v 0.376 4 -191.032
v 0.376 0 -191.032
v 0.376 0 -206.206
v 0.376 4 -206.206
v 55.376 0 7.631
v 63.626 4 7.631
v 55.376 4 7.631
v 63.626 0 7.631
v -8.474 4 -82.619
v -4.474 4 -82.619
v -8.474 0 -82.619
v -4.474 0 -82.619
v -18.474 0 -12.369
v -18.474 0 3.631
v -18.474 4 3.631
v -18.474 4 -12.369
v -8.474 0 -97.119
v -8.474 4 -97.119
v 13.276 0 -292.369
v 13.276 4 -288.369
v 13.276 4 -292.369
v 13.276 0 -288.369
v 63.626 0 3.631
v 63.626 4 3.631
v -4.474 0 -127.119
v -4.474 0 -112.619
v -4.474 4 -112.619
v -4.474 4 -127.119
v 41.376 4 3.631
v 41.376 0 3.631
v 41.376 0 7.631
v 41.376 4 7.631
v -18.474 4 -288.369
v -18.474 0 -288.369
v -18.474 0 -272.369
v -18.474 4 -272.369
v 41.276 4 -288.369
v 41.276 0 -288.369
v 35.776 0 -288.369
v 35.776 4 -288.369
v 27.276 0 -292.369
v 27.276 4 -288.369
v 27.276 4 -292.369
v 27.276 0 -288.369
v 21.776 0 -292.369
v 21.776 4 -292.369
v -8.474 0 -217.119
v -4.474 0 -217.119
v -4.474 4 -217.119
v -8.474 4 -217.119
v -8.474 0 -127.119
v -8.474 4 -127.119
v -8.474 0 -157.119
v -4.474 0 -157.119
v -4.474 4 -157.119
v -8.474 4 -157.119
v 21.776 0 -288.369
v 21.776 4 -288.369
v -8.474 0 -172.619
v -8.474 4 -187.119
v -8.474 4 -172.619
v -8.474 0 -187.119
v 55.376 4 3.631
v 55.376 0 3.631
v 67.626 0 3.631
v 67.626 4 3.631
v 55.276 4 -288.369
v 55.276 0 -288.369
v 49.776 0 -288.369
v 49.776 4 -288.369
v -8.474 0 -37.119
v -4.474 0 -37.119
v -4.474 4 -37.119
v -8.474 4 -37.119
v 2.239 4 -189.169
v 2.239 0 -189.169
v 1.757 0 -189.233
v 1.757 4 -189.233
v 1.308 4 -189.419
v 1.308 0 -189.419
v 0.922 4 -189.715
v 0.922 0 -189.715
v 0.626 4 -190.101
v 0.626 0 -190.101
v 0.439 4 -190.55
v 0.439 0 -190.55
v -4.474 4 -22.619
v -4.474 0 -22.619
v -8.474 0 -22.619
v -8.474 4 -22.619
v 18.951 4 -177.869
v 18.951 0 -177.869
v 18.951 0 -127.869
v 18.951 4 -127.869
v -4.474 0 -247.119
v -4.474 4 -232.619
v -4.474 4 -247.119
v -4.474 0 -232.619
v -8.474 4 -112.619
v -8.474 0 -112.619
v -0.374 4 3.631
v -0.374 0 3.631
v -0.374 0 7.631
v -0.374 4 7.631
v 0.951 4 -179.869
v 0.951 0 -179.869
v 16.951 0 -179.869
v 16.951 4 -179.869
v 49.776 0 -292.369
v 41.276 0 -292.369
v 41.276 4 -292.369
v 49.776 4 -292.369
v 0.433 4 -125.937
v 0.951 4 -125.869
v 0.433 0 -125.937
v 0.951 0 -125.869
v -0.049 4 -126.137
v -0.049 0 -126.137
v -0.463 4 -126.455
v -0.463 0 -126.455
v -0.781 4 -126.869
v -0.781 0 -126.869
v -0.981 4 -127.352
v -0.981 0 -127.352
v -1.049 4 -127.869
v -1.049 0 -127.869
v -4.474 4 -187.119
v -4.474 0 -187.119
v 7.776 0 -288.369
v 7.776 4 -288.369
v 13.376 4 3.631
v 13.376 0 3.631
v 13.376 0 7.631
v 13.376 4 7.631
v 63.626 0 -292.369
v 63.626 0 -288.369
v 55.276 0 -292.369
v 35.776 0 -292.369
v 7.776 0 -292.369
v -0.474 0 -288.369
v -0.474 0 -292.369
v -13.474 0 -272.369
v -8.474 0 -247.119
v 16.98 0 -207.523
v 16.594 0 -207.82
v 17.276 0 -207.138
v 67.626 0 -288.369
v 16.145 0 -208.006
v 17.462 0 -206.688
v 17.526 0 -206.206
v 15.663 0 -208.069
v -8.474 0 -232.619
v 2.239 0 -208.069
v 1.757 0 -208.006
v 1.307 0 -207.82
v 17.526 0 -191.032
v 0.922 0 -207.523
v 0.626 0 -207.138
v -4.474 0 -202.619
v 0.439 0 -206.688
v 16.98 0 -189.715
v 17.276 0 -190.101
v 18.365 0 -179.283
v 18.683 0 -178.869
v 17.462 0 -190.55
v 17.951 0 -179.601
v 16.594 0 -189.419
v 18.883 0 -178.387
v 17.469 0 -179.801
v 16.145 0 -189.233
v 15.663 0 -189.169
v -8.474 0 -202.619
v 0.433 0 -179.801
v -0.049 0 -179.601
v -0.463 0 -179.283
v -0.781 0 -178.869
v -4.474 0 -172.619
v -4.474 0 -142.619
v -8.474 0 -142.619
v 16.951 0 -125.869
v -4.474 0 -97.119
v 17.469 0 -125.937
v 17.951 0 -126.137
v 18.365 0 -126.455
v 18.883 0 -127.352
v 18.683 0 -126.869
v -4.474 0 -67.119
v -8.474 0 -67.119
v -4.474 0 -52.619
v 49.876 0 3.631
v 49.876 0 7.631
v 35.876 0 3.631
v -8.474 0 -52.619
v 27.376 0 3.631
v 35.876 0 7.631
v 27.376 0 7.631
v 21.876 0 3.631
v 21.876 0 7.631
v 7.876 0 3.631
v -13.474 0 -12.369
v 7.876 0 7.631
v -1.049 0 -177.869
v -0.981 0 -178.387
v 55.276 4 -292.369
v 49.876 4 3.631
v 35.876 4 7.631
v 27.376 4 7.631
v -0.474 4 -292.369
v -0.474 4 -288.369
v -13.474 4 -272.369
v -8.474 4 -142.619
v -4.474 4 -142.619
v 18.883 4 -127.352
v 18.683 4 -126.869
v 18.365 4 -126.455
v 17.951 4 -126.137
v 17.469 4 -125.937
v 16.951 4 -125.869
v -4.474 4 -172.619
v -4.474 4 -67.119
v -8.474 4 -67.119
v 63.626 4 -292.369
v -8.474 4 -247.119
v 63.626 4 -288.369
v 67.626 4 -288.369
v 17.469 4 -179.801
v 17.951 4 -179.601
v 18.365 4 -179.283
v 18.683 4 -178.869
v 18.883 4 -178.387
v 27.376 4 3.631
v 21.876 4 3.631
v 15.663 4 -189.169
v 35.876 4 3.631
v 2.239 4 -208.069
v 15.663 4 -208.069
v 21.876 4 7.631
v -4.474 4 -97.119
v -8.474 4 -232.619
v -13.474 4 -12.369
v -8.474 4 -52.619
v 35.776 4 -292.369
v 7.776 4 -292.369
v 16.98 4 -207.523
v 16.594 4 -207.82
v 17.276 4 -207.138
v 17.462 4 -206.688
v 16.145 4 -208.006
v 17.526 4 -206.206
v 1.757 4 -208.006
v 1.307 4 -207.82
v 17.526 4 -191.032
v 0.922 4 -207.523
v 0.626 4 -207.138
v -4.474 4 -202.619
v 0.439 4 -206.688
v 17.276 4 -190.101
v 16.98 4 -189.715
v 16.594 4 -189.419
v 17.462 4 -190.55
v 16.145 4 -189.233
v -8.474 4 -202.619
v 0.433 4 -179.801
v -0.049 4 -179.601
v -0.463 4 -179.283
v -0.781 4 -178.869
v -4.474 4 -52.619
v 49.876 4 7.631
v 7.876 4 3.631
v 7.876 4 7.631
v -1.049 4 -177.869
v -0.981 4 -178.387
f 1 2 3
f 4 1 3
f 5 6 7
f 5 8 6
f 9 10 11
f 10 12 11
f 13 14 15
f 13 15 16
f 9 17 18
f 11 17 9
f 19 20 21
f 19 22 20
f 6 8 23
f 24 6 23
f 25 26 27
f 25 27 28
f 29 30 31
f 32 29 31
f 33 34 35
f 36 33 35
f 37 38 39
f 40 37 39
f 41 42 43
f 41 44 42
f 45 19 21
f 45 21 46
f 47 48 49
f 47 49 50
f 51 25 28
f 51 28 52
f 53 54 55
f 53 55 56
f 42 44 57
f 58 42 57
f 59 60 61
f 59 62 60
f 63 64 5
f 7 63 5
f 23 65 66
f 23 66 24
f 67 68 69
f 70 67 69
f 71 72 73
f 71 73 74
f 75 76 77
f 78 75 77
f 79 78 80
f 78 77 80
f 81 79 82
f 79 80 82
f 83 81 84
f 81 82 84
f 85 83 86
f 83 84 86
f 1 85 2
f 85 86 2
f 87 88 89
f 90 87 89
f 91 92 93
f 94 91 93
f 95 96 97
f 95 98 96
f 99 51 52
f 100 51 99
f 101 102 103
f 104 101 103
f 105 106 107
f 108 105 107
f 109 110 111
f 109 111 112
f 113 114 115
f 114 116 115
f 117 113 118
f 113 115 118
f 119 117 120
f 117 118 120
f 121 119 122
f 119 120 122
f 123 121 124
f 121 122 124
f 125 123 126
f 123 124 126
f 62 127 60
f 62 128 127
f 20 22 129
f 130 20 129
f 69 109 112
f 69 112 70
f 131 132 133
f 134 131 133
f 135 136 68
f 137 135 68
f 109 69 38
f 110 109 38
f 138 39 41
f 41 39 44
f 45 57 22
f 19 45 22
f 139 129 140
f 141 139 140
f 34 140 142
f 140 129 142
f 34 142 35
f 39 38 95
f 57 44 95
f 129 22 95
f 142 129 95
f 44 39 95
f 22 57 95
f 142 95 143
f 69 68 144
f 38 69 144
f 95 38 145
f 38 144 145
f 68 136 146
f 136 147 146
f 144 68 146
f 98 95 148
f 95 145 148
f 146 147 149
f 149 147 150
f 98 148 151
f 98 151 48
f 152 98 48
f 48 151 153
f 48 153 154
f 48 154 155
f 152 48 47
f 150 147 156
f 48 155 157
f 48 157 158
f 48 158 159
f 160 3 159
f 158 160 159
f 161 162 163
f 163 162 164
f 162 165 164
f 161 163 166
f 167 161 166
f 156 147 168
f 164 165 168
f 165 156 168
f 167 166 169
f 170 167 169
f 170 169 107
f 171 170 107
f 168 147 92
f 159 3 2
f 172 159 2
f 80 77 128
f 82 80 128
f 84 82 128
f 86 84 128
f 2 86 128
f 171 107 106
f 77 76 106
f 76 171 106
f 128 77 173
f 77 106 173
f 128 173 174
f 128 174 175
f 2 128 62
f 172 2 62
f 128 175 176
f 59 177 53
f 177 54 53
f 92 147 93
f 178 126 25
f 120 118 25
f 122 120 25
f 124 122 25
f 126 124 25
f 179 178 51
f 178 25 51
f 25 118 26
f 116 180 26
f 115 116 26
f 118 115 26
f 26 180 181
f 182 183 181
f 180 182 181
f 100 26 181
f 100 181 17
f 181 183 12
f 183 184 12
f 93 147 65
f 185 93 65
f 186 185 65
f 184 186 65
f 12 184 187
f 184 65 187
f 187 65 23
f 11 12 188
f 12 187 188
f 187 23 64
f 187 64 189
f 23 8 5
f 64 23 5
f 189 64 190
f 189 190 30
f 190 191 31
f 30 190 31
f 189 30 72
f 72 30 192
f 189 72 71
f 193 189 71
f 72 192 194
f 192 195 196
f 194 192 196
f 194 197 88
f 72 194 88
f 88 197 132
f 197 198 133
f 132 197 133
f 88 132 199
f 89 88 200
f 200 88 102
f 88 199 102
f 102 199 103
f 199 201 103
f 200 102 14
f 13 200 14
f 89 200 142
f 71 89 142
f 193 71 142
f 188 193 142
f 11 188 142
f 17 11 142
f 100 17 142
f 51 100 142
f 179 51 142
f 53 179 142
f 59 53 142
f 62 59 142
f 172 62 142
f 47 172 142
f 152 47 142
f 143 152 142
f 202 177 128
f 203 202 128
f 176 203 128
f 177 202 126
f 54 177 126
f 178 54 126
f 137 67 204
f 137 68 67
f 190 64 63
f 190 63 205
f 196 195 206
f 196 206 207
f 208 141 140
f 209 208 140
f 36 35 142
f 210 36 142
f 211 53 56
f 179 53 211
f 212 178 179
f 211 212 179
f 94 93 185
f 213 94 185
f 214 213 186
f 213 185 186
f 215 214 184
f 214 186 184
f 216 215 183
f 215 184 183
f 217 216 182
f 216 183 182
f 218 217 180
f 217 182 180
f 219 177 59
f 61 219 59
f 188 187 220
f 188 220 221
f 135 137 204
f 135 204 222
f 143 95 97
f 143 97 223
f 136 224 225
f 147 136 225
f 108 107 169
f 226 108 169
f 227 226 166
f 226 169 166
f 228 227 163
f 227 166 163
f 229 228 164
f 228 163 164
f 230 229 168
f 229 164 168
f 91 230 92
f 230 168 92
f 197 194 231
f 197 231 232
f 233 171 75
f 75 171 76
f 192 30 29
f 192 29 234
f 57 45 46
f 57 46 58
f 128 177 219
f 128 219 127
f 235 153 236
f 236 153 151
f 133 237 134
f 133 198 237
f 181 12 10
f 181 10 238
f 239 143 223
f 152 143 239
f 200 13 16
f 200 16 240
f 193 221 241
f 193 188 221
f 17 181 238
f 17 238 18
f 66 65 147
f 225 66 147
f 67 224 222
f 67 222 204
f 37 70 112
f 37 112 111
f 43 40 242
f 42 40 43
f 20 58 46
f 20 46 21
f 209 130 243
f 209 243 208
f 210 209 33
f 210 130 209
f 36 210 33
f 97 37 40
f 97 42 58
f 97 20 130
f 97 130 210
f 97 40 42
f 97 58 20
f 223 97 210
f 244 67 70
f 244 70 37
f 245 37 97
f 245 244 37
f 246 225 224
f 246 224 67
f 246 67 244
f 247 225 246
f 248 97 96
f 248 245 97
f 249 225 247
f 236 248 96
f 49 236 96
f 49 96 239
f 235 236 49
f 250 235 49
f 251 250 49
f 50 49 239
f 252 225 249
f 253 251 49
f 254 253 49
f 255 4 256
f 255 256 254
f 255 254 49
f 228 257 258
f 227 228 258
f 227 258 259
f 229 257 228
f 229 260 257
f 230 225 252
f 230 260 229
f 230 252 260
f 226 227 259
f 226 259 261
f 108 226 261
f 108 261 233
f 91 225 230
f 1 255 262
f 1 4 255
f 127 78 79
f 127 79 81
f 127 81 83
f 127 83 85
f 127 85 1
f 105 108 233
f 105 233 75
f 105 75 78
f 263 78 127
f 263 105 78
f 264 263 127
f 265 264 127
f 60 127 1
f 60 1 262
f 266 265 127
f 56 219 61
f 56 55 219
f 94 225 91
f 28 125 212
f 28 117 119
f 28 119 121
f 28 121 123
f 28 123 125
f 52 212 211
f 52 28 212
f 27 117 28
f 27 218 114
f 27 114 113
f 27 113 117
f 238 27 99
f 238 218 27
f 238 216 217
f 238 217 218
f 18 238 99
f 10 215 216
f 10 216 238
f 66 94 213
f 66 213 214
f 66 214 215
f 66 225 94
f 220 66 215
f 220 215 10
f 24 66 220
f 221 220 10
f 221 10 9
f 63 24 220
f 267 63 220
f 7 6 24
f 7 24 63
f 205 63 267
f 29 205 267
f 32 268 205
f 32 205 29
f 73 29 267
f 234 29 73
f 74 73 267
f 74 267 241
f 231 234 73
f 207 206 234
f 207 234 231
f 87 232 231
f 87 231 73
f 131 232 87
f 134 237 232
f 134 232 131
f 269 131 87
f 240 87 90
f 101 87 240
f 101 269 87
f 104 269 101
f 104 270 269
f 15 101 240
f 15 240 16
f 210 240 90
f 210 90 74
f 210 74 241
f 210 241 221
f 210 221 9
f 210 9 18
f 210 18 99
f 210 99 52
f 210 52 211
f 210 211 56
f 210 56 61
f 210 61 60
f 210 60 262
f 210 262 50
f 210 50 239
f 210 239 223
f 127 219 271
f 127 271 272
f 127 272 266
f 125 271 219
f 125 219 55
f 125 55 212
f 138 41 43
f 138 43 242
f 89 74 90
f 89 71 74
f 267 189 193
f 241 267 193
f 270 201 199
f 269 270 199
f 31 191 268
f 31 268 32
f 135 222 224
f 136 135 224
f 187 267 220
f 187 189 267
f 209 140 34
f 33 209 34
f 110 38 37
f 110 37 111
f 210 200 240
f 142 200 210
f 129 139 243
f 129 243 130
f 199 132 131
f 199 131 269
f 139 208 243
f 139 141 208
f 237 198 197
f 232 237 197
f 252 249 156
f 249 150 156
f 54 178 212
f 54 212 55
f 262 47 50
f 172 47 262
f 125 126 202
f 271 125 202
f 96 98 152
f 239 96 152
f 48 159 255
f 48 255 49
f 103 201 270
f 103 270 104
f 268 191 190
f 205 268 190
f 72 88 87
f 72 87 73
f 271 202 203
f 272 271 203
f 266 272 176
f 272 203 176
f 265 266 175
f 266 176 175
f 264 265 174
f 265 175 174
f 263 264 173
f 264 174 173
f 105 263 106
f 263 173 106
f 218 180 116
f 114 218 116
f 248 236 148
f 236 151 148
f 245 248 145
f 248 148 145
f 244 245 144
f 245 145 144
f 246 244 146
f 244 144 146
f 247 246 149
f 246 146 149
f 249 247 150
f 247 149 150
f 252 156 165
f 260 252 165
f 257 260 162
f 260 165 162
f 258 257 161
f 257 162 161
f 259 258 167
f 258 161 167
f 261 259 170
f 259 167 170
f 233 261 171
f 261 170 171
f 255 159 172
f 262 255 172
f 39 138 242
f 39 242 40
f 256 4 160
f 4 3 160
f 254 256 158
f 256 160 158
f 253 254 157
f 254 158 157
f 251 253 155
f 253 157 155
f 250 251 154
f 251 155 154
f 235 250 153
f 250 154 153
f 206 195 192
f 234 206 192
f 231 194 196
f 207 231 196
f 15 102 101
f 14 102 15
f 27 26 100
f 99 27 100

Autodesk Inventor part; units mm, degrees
ref_plane "YZ Plane" through (0, 0, 0) normal (1, 0, 0) x (0, 1, 0)
ref_plane "XZ Plane" through (0, 0, 0) normal (0, 1, 0) x (-1, 0, 0)
ref_plane "XY Plane" through (0, 0, 0) normal (0, 0, 1) x (1, 0, 0)
sketch "Sketch1" plane through (0, 0, 0) normal (0, 1, 0) x (-1, 0, 0)
  line L0 (-71.6259, 7.6308) -> (8.4741, 7.6308)
  line L1 (8.4741, 7.6308) -> (8.4741, -292.3692)
  line L2 (8.4741, -292.3692) -> (-71.6259, -292.3692)
  line L3 (-71.6259, -292.3692) -> (-71.6259, 7.6308)
  point P0 (0, 0)
extrude "Extrusion1" add sketch "Sketch1" along normal blind 4
sketch "Sketch2" plane through (0, 0, 0) normal (0, -1, 0) x (1, 0, 0)
  line L0 (-0.3741, 7.6308) -> (-18.4741, 7.6308) construction
  line L1 (-0.3741, 3.6308) -> (-0.3741, 7.6308) construction
  line L2 (7.6259, 7.6308) -> (7.6259, 3.6308) construction
  line L3 (13.6259, 3.6308) -> (7.6259, 3.6308) construction
  line L4 (13.6259, 3.6308) -> (13.6259, 7.6308) construction
  line L5 (21.6259, 7.6308) -> (21.6259, 3.6308) construction
  line L6 (27.6259, 3.6308) -> (21.6259, 3.6308) construction
  line L7 (27.6259, 3.6308) -> (27.6259, 7.6308) construction
  line L8 (35.6259, 7.6308) -> (35.6259, 3.6308) construction
  line L9 (41.6259, 3.6308) -> (35.6259, 3.6308) construction
  line L10 (41.6259, 3.6308) -> (41.6259, 7.6308) construction
  line L11 (49.6259, 7.6308) -> (49.6259, 3.6308) construction
  line L12 (55.6259, 3.6308) -> (49.6259, 3.6308) construction
  line L13 (55.6259, 3.6308) -> (55.6259, 7.6308) construction
  line L14 (63.6259, 7.6308) -> (63.6259, 3.6308) construction
  line L15 (67.6259, 3.6308) -> (63.6259, 3.6308) construction
  line L16 (67.6259, 7.6308) -> (67.6259, -292.3692) projected
  line L17 (71.6259, 7.6308) -> (71.6259, -292.3692) projected
  line L18 (67.6259, 7.6308) -> (67.6259, -292.3692) projected
  line L19 (71.6259, 7.6308) -> (71.6259, -292.3692) projected
  line L20 (67.6259, 7.6308) -> (67.6259, -292.3692) projected
  line L21 (71.6259, 7.6308) -> (71.6259, -292.3692) projected
  line L22 (67.6259, 7.6308) -> (67.6259, -292.3692) projected
  line L23 (71.6259, 7.6308) -> (71.6259, -292.3692) projected
  line L24 (67.6259, 7.6308) -> (67.6259, -292.3692) projected
  line L25 (71.6259, 7.6308) -> (71.6259, -292.3692) projected
  line L26 (67.6259, 7.6308) -> (67.6259, -292.3692) projected
  line L27 (71.6259, 7.6308) -> (71.6259, -292.3692) projected
  line L28 (67.6259, 7.6308) -> (67.6259, -292.3692) projected
  line L29 (71.6259, 7.6308) -> (71.6259, -292.3692) projected
  line L30 (67.6259, 7.6308) -> (67.6259, -292.3692) projected
  line L31 (71.6259, 7.6308) -> (71.6259, -292.3692) projected
  line L32 (67.6259, 7.6308) -> (67.6259, -292.3692) projected
  line L33 (71.6259, 7.6308) -> (71.6259, -292.3692) projected
  line L34 (67.6259, 7.6308) -> (67.6259, -292.3692) projected
  line L35 (71.6259, 7.6308) -> (71.6259, -292.3692) projected
  line L36 (13.5259, -288.3692) -> (7.5259, -288.3692) projected
  line L37 (55.5259, -292.3692) -> (55.5259, -288.3692) projected
  line L38 (55.5259, -288.3692) -> (49.5259, -288.3692) projected
  line L39 (49.5259, -288.3692) -> (49.5259, -292.3692) projected
  line L40 (41.5259, -288.3692) -> (35.5259, -288.3692) projected
  line L41 (41.5259, -292.3692) -> (41.5259, -288.3692) projected
  line L42 (35.5259, -288.3692) -> (35.5259, -292.3692) projected
  line L43 (27.5259, -288.3692) -> (21.5259, -288.3692) projected
  line L44 (27.5259, -292.3692) -> (27.5259, -288.3692) projected
  line L45 (21.5259, -288.3692) -> (21.5259, -292.3692) projected
  line L46 (13.5259, -288.3692) -> (7.5259, -288.3692) projected
  line L47 (13.5259, -292.3692) -> (13.5259, -288.3692) projected
  line L48 (7.5259, -288.3692) -> (7.5259, -292.3692) projected
  line L49 (-8.4741, -292.3692) -> (-8.4741, 7.6308) projected
  line L50 (-8.4741, -22.3692) -> (-8.4741, -37.3692) projected
  line L51 (-8.4741, -37.3692) -> (-4.4741, -37.3692) projected
  line L52 (-4.4741, -22.3692) -> (-4.4741, -37.3692) projected
  line L53 (-8.4741, -22.3692) -> (-4.4741, -22.3692) projected
  line L54 (-8.4741, -52.3692) -> (-8.4741, -67.3692) projected
  line L55 (-8.4741, -67.3692) -> (-4.4741, -67.3692) projected
  line L56 (-4.4741, -52.3692) -> (-4.4741, -67.3692) projected
  line L57 (-8.4741, -52.3692) -> (-4.4741, -52.3692) projected
  line L58 (-8.4741, -82.3692) -> (-8.4741, -97.3692) projected
  line L59 (-8.4741, -97.3692) -> (-4.4741, -97.3692) projected
  line L60 (-4.4741, -82.3692) -> (-4.4741, -97.3692) projected
  line L61 (-8.4741, -82.3692) -> (-4.4741, -82.3692) projected
  line L62 (-8.4741, -112.3692) -> (-8.4741, -127.3692) projected
  line L63 (-8.4741, -127.3692) -> (-4.4741, -127.3692) projected
  line L64 (-4.4741, -112.3692) -> (-4.4741, -127.3692) projected
  line L65 (-8.4741, -112.3692) -> (-4.4741, -112.3692) projected
  line L66 (-8.4741, -142.3692) -> (-8.4741, -157.3692) projected
  line L67 (-8.4741, -157.3692) -> (-4.4741, -157.3692) projected
  line L68 (-4.4741, -142.3692) -> (-4.4741, -157.3692) projected
  line L69 (-8.4741, -142.3692) -> (-4.4741, -142.3692) projected
  line L70 (-8.4741, -172.3692) -> (-8.4741, -187.3692) projected
  line L71 (-8.4741, -187.3692) -> (-4.4741, -187.3692) projected
  line L72 (-4.4741, -172.3692) -> (-4.4741, -187.3692) projected
  line L73 (-8.4741, -172.3692) -> (-4.4741, -172.3692) projected
  line L74 (-8.4741, -202.3692) -> (-8.4741, -217.3692) projected
  line L75 (-8.4741, -217.3692) -> (-4.4741, -217.3692) projected
  line L76 (-4.4741, -202.3692) -> (-4.4741, -217.3692) projected
  line L77 (-8.4741, -202.3692) -> (-4.4741, -202.3692) projected
  line L78 (-8.4741, -232.3692) -> (-8.4741, -247.3692) projected
  line L79 (-8.4741, -247.3692) -> (-4.4741, -247.3692) projected
  line L80 (-4.4741, -232.3692) -> (-4.4741, -247.3692) projected
  line L81 (-8.4741, -232.3692) -> (-4.4741, -232.3692) projected
  line L82 (71.6259, -37.1192) -> (67.6259, -37.1192)
  line L83 (67.6259, -22.6192) -> (71.6259, -22.6192)
  line L84 (67.6259, -52.6192) -> (71.6259, -52.6192)
  line L85 (71.6259, -67.1192) -> (67.6259, -67.1192)
  line L86 (67.6259, -82.6192) -> (71.6259, -82.6192)
  line L87 (71.6259, -97.1192) -> (67.6259, -97.1192)
  line L88 (67.6259, -112.6192) -> (71.6259, -112.6192)
  line L89 (71.6259, -127.1192) -> (67.6259, -127.1192)
  line L90 (67.6259, -142.6192) -> (71.6259, -142.6192)
  line L91 (71.6259, -157.1192) -> (67.6259, -157.1192)
  line L92 (67.6259, -172.6192) -> (71.6259, -172.6192)
  line L93 (71.6259, -187.1192) -> (67.6259, -187.1192)
  line L94 (67.6259, -202.6192) -> (71.6259, -202.6192)
  line L95 (71.6259, -217.1192) -> (67.6259, -217.1192)
  line L96 (67.6259, -232.6192) -> (71.6259, -232.6192)
  line L97 (71.6259, -247.1192) -> (67.6259, -247.1192)
  line L98 (67.6259, -262.6192) -> (71.6259, -262.6192)
  line L99 (71.6259, -277.1192) -> (67.6259, -277.1192)
  line L100 (-4.4741, -22.6192) -> (-8.4741, -22.6192)
  line L101 (-4.4741, -37.1192) -> (-8.4741, -37.1192)
  line L102 (-4.4741, -52.6192) -> (-8.4741, -52.6192)
  line L103 (-4.4741, -67.1192) -> (-8.4741, -67.1192)
  line L104 (-4.4741, -82.6192) -> (-8.4741, -82.6192)
  line L105 (-4.4741, -97.1192) -> (-8.4741, -97.1192)
  line L106 (-4.4741, -112.6192) -> (-8.4741, -112.6192)
  line L107 (-4.4741, -127.1192) -> (-8.4741, -127.1192)
  line L108 (-4.4741, -142.6192) -> (-8.4741, -142.6192)
  line L109 (-4.4741, -157.1192) -> (-8.4741, -157.1192)
  line L110 (-4.4741, -172.6192) -> (-8.4741, -172.6192)
  line L111 (-4.4741, -187.1192) -> (-8.4741, -187.1192)
  line L112 (-4.4741, -202.6192) -> (-8.4741, -202.6192)
  line L113 (-4.4741, -217.1192) -> (-8.4741, -217.1192)
  line L114 (-4.4741, -232.6192) -> (-8.4741, -232.6192)
  line L115 (-4.4741, -247.1192) -> (-8.4741, -247.1192)
  line L116 (7.8759, 7.6308) -> (7.8759, 3.6308)
  line L117 (13.3759, 3.6308) -> (13.3759, 7.6308)
  line L118 (21.8759, 7.6308) -> (21.8759, 3.6308)
  line L119 (27.3759, 3.6308) -> (27.3759, 7.6308)
  line L120 (35.8759, 7.6308) -> (35.8759, 3.6308)
  line L121 (41.3759, 3.6308) -> (41.3759, 7.6308)
  line L122 (49.8759, 7.6308) -> (49.8759, 3.6308)
  line L123 (55.3759, 3.6308) -> (55.3759, 7.6308)
  line L124 (7.7759, -292.3692) -> (7.7759, -288.3692)
  line L125 (13.2759, -288.3692) -> (13.2759, -292.3692)
  line L126 (21.7759, -292.3692) -> (21.7759, -288.3692)
  line L127 (27.2759, -288.3692) -> (27.2759, -292.3692)
  line L128 (35.7759, -292.3692) -> (35.7759, -288.3692)
  line L129 (41.2759, -288.3692) -> (41.2759, -292.3692)
  line L130 (49.7759, -292.3692) -> (49.7759, -288.3692)
  line L131 (55.2759, -288.3692) -> (55.2759, -292.3692)
  line L132 (13.6259, 3.6308) -> (7.6259, 3.6308) projected
  line L133 (27.6259, 3.6308) -> (21.6259, 3.6308) projected
  line L134 (41.6259, 3.6308) -> (35.6259, 3.6308) projected
  line L135 (55.6259, 3.6308) -> (49.6259, 3.6308) projected
  line L136 (71.6259, -292.3692) -> (-8.4741, -292.3692) projected
  line L137 (-0.3741, 3.6308) -> (-0.3741, 7.6308) projected
  line L138 (-8.4741, 7.6308) -> (71.6259, 7.6308) projected
  line L139 (71.6259, 7.6308) -> (71.6259, -292.3692) projected
  line L140 (63.6259, 7.6308) -> (63.6259, 3.6308) projected
  line L141 (67.6259, 3.6308) -> (63.6259, 3.6308) projected
  line L142 (-0.3741, 3.6308) -> (-18.4741, 3.6308) projected
  line L143 (-18.4741, 7.6308) -> (-18.4741, 3.6308) projected
  line L144 (-0.3741, 7.6308) -> (-18.4741, 7.6308) projected
  line L145 (-0.3741, 3.6308) -> (-0.3741, 7.6308) projected
  line L146 (-0.3741, 7.6308) -> (-18.4741, 7.6308) projected
  line L147 (-18.4741, 7.6308) -> (-18.4741, 3.6308) projected
  line L148 (-0.3741, 3.6308) -> (-18.4741, 3.6308) projected
  line L149 (-0.4741, -292.3692) -> (-0.4741, -288.3692) projected
  line L150 (-0.4741, -288.3692) -> (-18.4741, -288.3692) projected
  line L151 (-18.4741, -292.3692) -> (-18.4741, -288.3692) projected
  line L152 (-0.4741, -292.3692) -> (-18.4741, -292.3692) projected
  line L153 (15.6627, -189.1692) -> (2.2391, -189.1692)
  line L154 (0.3759, -191.0324) -> (0.3759, -206.206)
  line L155 (2.2391, -208.0692) -> (15.6627, -208.0692)
  line L156 (17.5259, -206.206) -> (17.5259, -191.0324)
  arc A0 (17.5259, -191.0324) -> (15.6627, -189.1692) centre (15.6627, -191.0324) ccw
  arc A1 (2.2391, -189.1692) -> (0.3759, -191.0324) centre (2.2391, -191.0324) ccw
  arc A2 (15.6627, -208.0692) -> (17.5259, -206.206) centre (15.6627, -206.206) ccw
  arc A3 (0.3759, -206.206) -> (2.2391, -208.0692) centre (2.2391, -206.206) ccw
  line L157 (16.9509, -125.8692) -> (0.9509, -125.8692)
  line L158 (-1.0491, -127.8692) -> (-1.0491, -177.8692)
  line L159 (0.9509, -179.8692) -> (16.9509, -179.8692)
  line L160 (18.9509, -177.8692) -> (18.9509, -127.8692)
  arc A4 (18.9509, -127.8692) -> (16.9509, -125.8692) centre (16.9509, -127.8692) ccw
  arc A5 (0.9509, -125.8692) -> (-1.0491, -127.8692) centre (0.9509, -127.8692) ccw
  arc A6 (16.9509, -179.8692) -> (18.9509, -177.8692) centre (16.9509, -177.8692) ccw
  arc A7 (-1.0491, -177.8692) -> (0.9509, -179.8692) centre (0.9509, -177.8692) ccw
  line L161 (67.6259, -292.3692) -> (71.6259, -292.3692) projected
  line L162 (67.6259, 7.6308) -> (71.6259, 7.6308) projected
  line L163 (67.6259, -292.3692) -> (71.6259, -292.3692) projected
  line L164 (67.6259, 7.6308) -> (71.6259, 7.6308) projected
  line L165 (67.6259, -292.3692) -> (71.6259, -292.3692) projected
  line L166 (67.6259, 7.6308) -> (71.6259, 7.6308) projected
  line L167 (67.6259, -292.3692) -> (71.6259, -292.3692) projected
  line L168 (67.6259, 7.6308) -> (71.6259, 7.6308) projected
  line L169 (67.6259, -292.3692) -> (71.6259, -292.3692) projected
  line L170 (67.6259, 7.6308) -> (71.6259, 7.6308) projected
  line L171 (67.6259, -292.3692) -> (71.6259, -292.3692) projected
  line L172 (67.6259, 7.6308) -> (71.6259, 7.6308) projected
  line L173 (67.6259, -292.3692) -> (71.6259, -292.3692) projected
  line L174 (67.6259, 7.6308) -> (71.6259, 7.6308) projected
  line L175 (67.6259, -292.3692) -> (71.6259, -292.3692) projected
  line L176 (67.6259, 7.6308) -> (71.6259, 7.6308) projected
  line L177 (67.6259, -292.3692) -> (71.6259, -292.3692) projected
  line L178 (67.6259, 7.6308) -> (71.6259, 7.6308) projected
  line L179 (67.6259, -292.3692) -> (71.6259, -292.3692) projected
  line L180 (67.6259, 7.6308) -> (71.6259, 7.6308) projected
  point P0 (0, 0)
  point P1 (71.6259, -7.3692)
  point P2 (71.6259, -37.3692)
  point P3 (71.6259, -22.3692)
  point P4 (71.6259, -67.3692)
  point P5 (71.6259, -52.3692)
  point P6 (71.6259, -97.3692)
  point P7 (71.6259, -82.3692)
  point P8 (71.6259, -127.3692)
  point P9 (71.6259, -112.3692)
  point P10 (71.6259, -157.3692)
  point P11 (71.6259, -142.3692)
  point P12 (71.6259, -187.3692)
  point P13 (71.6259, -172.3692)
  point P14 (71.6259, -217.3692)
  point P15 (71.6259, -202.3692)
  point P16 (71.6259, -247.3692)
  point P17 (71.6259, -232.3692)
  point P18 (71.6259, -277.3692)
  point P19 (71.6259, -262.3692)
  point P20 (67.6259, -97.1192)
  point P21 (71.6259, -97.1192)
  point P22 (71.6259, -82.6192)
  point P23 (67.6259, -82.6192)
  point P24 (67.6259, -127.1192)
  point P25 (71.6259, -127.1192)
  point P26 (71.6259, -112.6192)
  point P27 (67.6259, -112.6192)
  point P28 (67.6259, -157.1192)
  point P29 (71.6259, -157.1192)
  point P30 (71.6259, -142.6192)
  point P31 (67.6259, -142.6192)
  point P32 (67.6259, -187.1192)
  point P33 (71.6259, -187.1192)
  point P34 (71.6259, -172.6192)
  point P35 (67.6259, -172.6192)
  point P36 (67.6259, -217.1192)
  point P37 (71.6259, -217.1192)
  point P38 (71.6259, -202.6192)
  point P39 (67.6259, -202.6192)
  point P40 (67.6259, -247.1192)
  point P41 (71.6259, -247.1192)
  point P42 (71.6259, -232.6192)
  point P43 (67.6259, -232.6192)
  point P44 (67.6259, -277.1192)
  point P45 (71.6259, -277.1192)
  point P46 (71.6259, -262.6192)
  point P47 (67.6259, -262.6192)
  point P48 (-8.4741, -247.1192)
  point P49 (-4.4741, -247.1192)
  point P50 (-4.4741, -232.6192)
  point P51 (-8.4741, -232.6192)
  point P52 (-8.4741, -217.1192)
  point P53 (-4.4741, -217.1192)
  point P54 (-4.4741, -202.6192)
  point P55 (-8.4741, -202.6192)
  point P56 (-8.4741, -187.1192)
  point P57 (-4.4741, -187.1192)
  point P58 (-4.4741, -172.6192)
  point P59 (-8.4741, -172.6192)
  point P60 (-8.4741, -157.1192)
  point P61 (-4.4741, -157.1192)
  point P62 (-4.4741, -142.6192)
  point P63 (-8.4741, -142.6192)
  point P64 (-8.4741, -127.1192)
  point P65 (-4.4741, -127.1192)
  point P66 (-4.4741, -112.6192)
  point P67 (-8.4741, -112.6192)
  point P68 (-8.4741, -97.1192)
  point P69 (-4.4741, -97.1192)
  point P70 (-4.4741, -82.6192)
  point P71 (-8.4741, -82.6192)
  point P72 (-8.4741, -67.1192)
  point P73 (-4.4741, -67.1192)
  point P74 (-4.4741, -52.6192)
  point P75 (-8.4741, -52.6192)
  point P76 (-8.4741, -37.1192)
  point P77 (-8.4741, -22.6192)
  point P78 (67.6259, -67.1192)
  point P79 (71.6259, -67.1192)
  point P80 (71.6259, -52.6192)
  point P81 (67.6259, -52.6192)
  point P82 (8.9509, -189.1692)
  point P83 (8.9509, -179.8692)
  point P84 (67.6259, -292.3692)
  point P85 (67.6259, 3.6308)
  point P86 (67.6259, 7.6308)
  point P87 (71.6259, 3.6308)
  point P88 (67.6259, -288.3692)
  point P89 (71.6259, -288.3692)
  point P90 (-8.4741, 3.6308)
  point P91 (21.7759, -288.3692)
  point P92 (35.7759, -288.3692)
  point P93 (49.7759, -288.3692)
  point P94 (-8.4741, -288.3692)
  dimension "d7" = 30
  dimension "d15" = 30
  dimension "d20" = 0.25
  dimension "d23" = 14
  dimension "d28" = 0.25
  dimension "d31" = 14
  dimension "d49" = 2
  dimension "d50" = 50
  dimension "d51" = 20
extrude "Extrusion2" cut sketch "Sketch2" against normal through all contours L138 L17 L83 L16 | L16 L141 L140 L138 | L83 L17 L82 L16 | L123 L135 L122 L138 | L82 L17 L84 L16 | L84 L17 L85 L16 | L121 L134 L120 L138 | L85 L17 L86 L16 | L86 L17 L87 L16 | L119 L133 L118 L138 | L87 L17 L88 L16 | L88 L17 L89 L16 | L117 L132 L116 L138 | L89 L17 L90 L16 | L90 L17 L91 L16 | L137 L142 L49 L138 | L91 L17 L92 L16 | L92 L17 L93 L16 | L93 L17 L94 L16 | L94 L17 L95 L16 | L100 L52 L101 L49 | L95 L17 L96 L16 | L96 L17 L97 L16 | L97 L17 L98 L16 | L98 L17 L99 L16 | L102 L56 L103 L49 | L99 L17 L136 L16 | L136 L130 L38 L131 | L104 L60 L105 L49 | L136 L128 L40 L129 | L106 L64 L107 L49 | L136 L126 L43 L127 | L108 L68 L109 L49 | L136 L124 L36 L125 | L110 L72 L111 L49 | L136 L49 L150 L149 | L112 L76 L113 L49 | L49 L114 L80 L115 | A0 L156 A2 L155 A3 L154 A1 L153 | A4 L160 A6 L159 A7 L158 A5 L157
sketch "Sketch3" plane through (0, 0, 0) normal (0, -1, 0) x (1, 0, 0)
  line L0 (-8.4741, 7.6308) -> (7.8759, 7.6308) projected
  line L1 (7.7759, -292.3692) -> (-8.4741, -292.3692) projected
  line L2 (-8.4741, -22.6192) -> (-8.4741, 3.6308) projected
  line L3 (-8.4741, 3.6308) -> (-18.4741, 3.6308)
  line L4 (-18.4741, 3.6308) -> (-18.4741, -12.3692)
  line L5 (-18.4741, -12.3692) -> (-8.4741, -12.3692)
  line L6 (-8.4741, -12.3692) -> (-8.4741, 3.6308)
  line L7 (-8.4741, -292.3692) -> (-8.4741, -247.1192) projected
  line L8 (-8.4741, -288.3692) -> (-18.4741, -288.3692)
  line L9 (-18.4741, -288.3692) -> (-18.4741, -272.3692)
  line L10 (-18.4741, -272.3692) -> (-8.4741, -272.3692)
  line L11 (-8.4741, -272.3692) -> (-8.4741, -288.3692)
  line L12 (-8.4741, -12.3692) -> (-8.4741, -272.3692)
  line L13 (49.8759, 3.6308) -> (49.8759, 7.6308) projected
  line L14 (41.3759, 7.6308) -> (49.8759, 7.6308) projected
  line L15 (41.3759, 7.6308) -> (41.3759, 3.6308) projected
  line L16 (41.3759, 3.6308) -> (35.8759, 3.6308) projected
  line L17 (35.8759, 3.6308) -> (35.8759, 7.6308) projected
  line L18 (27.3759, 7.6308) -> (35.8759, 7.6308) projected
  line L19 (27.3759, 7.6308) -> (27.3759, 3.6308) projected
  line L20 (27.3759, 3.6308) -> (21.8759, 3.6308) projected
  line L21 (21.8759, 3.6308) -> (21.8759, 7.6308) projected
  line L22 (13.3759, 7.6308) -> (21.8759, 7.6308) projected
  line L23 (13.3759, 7.6308) -> (13.3759, 3.6308) projected
  line L24 (13.3759, 3.6308) -> (7.8759, 3.6308) projected
  line L25 (7.8759, 3.6308) -> (7.8759, 7.6308) projected
  line L26 (-0.3741, 7.6308) -> (7.8759, 7.6308) projected
  line L27 (-0.3741, 7.6308) -> (-0.3741, 3.6308) projected
  line L28 (-0.3741, 3.6308) -> (-8.4741, 3.6308) projected
  line L29 (-8.4741, -22.6192) -> (-8.4741, 3.6308) projected
  line L30 (-4.4741, -22.6192) -> (-4.4741, -37.1192) projected
  line L31 (-8.4741, -52.6192) -> (-8.4741, -37.1192) projected
  line L32 (-4.4741, -52.6192) -> (-4.4741, -67.1192) projected
  line L33 (-8.4741, -82.6192) -> (-8.4741, -67.1192) projected
  line L34 (-4.4741, -82.6192) -> (-4.4741, -97.1192) projected
  line L35 (-8.4741, -112.6192) -> (-8.4741, -97.1192) projected
  line L36 (-4.4741, -112.6192) -> (-4.4741, -127.1192) projected
  line L37 (-8.4741, -142.6192) -> (-8.4741, -127.1192) projected
  line L38 (-4.4741, -142.6192) -> (-4.4741, -157.1192) projected
  line L39 (-8.4741, -172.6192) -> (-8.4741, -157.1192) projected
  line L40 (-4.4741, -172.6192) -> (-4.4741, -187.1192) projected
  line L41 (-8.4741, -202.6192) -> (-8.4741, -187.1192) projected
  line L42 (-4.4741, -202.6192) -> (-4.4741, -217.1192) projected
  line L43 (-8.4741, -232.6192) -> (-8.4741, -217.1192) projected
  line L44 (-4.4741, -232.6192) -> (-4.4741, -247.1192) projected
  line L45 (-8.4741, -288.3692) -> (-8.4741, -247.1192) projected
  line L46 (7.7759, -292.3692) -> (-0.4741, -292.3692) projected
  line L47 (7.7759, -288.3692) -> (13.2759, -288.3692) projected
  line L48 (21.7759, -292.3692) -> (13.2759, -292.3692) projected
  line L49 (67.6259, -292.3692) -> (67.6259, 3.6308) projected
  line L50 (55.3759, 7.6308) -> (63.6259, 7.6308) projected
  line L51 (55.3759, 7.6308) -> (55.3759, 3.6308) projected
  line L52 (55.3759, 3.6308) -> (49.8759, 3.6308) projected
  line L53 (-13.4741, -12.3692) -> (-13.4741, -272.3692)
  line L54 (67.6259, 3.6308) -> (63.6259, 3.6308) projected
  line L55 (63.6259, 3.6308) -> (63.6259, 7.6308) projected
  line L56 (-8.4741, -22.6192) -> (-4.4741, -22.6192) projected
  line L57 (-4.4741, -37.1192) -> (-8.4741, -37.1192) projected
  line L58 (-8.4741, -52.6192) -> (-4.4741, -52.6192) projected
  line L59 (-4.4741, -67.1192) -> (-8.4741, -67.1192) projected
  line L60 (-8.4741, -82.6192) -> (-4.4741, -82.6192) projected
  line L61 (-4.4741, -97.1192) -> (-8.4741, -97.1192) projected
  line L62 (-8.4741, -112.6192) -> (-4.4741, -112.6192) projected
  line L63 (-4.4741, -127.1192) -> (-8.4741, -127.1192) projected
  line L64 (-8.4741, -142.6192) -> (-4.4741, -142.6192) projected
  line L65 (-4.4741, -157.1192) -> (-8.4741, -157.1192) projected
  line L66 (-8.4741, -172.6192) -> (-4.4741, -172.6192) projected
  line L67 (-4.4741, -187.1192) -> (-8.4741, -187.1192) projected
  line L68 (-8.4741, -202.6192) -> (-4.4741, -202.6192) projected
  line L69 (-4.4741, -217.1192) -> (-8.4741, -217.1192) projected
  line L70 (-8.4741, -232.6192) -> (-4.4741, -232.6192) projected
  line L71 (-4.4741, -247.1192) -> (-8.4741, -247.1192) projected
  line L72 (7.7759, -292.3692) -> (7.7759, -288.3692) projected
  line L73 (13.2759, -288.3692) -> (13.2759, -292.3692) projected
  line L74 (27.2759, -288.3692) -> (27.2759, -292.3692) projected
  line L75 (35.7759, -292.3692) -> (27.2759, -292.3692) projected
  line L76 (35.7759, -292.3692) -> (35.7759, -288.3692) projected
  line L77 (35.7759, -288.3692) -> (41.2759, -288.3692) projected
  line L78 (41.2759, -288.3692) -> (41.2759, -292.3692) projected
  line L79 (49.7759, -292.3692) -> (41.2759, -292.3692) projected
  line L80 (49.7759, -292.3692) -> (49.7759, -288.3692) projected
  line L81 (49.7759, -288.3692) -> (55.2759, -288.3692) projected
  line L82 (55.2759, -288.3692) -> (55.2759, -292.3692) projected
  line L83 (67.6259, -292.3692) -> (55.2759, -292.3692) projected
  line L84 (21.7759, -292.3692) -> (21.7759, -288.3692) projected
  line L85 (21.7759, -288.3692) -> (27.2759, -288.3692) projected
  line L86 (-8.4741, -288.3692) -> (-0.4741, -288.3692) projected
  line L87 (-0.4741, -288.3692) -> (-0.4741, -292.3692) projected
  point P0 (0, 0)
  point P1 (7.5259, -292.3692)
  point P2 (-8.4741, -22.3692)
  point P3 (-8.4741, -247.3692)
  point P4 (-8.4741, -247.1192)
  point P5 (-8.4741, -22.6192)
  dimension "d44" = 20
  dimension "d45" = 10
  dimension "d46" = 5
extrude "Extrusion3" add sketch "Sketch3" against normal up to surface (4 mm away) contours L2 L5 L4 L3 | L2 L12 L7 L10 L53 L5 | L10 L7 L8 L9
sketch "Sketch4" plane through (0, 4, 0) normal (0, 1, 0) x (1, 0, 0)
  line L0 (-8.4741, 67.1192) -> (-4.4741, 67.1192) projected
  line L1 (-4.4741, 67.1192) -> (-4.4741, 52.6192) projected
  line L2 (-4.4741, 52.6192) -> (-8.4741, 52.6192) projected
  line L3 (-8.4741, 67.1192) -> (-8.4741, 52.6192) projected
  line L4 (-8.4741, 247.1192) -> (-4.4741, 247.1192) projected
  line L5 (-4.4741, 247.1192) -> (-4.4741, 232.6192) projected
  line L6 (-4.4741, 232.6192) -> (-8.4741, 232.6192) projected
  line L7 (-8.4741, 247.1192) -> (-8.4741, 232.6192) projected
  line L8 (-8.4741, 97.1192) -> (-8.4741, 82.6192) projected
  line L9 (-8.4741, 97.1192) -> (-4.4741, 97.1192) projected
  line L10 (-4.4741, 97.1192) -> (-4.4741, 82.6192) projected
  line L11 (-4.4741, 82.6192) -> (-8.4741, 82.6192) projected
  line L12 (-18.4741, 288.3692) -> (-0.4741, 288.3692) projected
  line L13 (-18.4741, 272.3692) -> (-18.4741, 288.3692) projected
  line L14 (-13.4741, 272.3692) -> (-18.4741, 272.3692) projected
  line L15 (-13.4741, 12.3692) -> (-13.4741, 272.3692) projected
  line L16 (-18.4741, 12.3692) -> (-13.4741, 12.3692) projected
  line L17 (-18.4741, -3.6308) -> (-18.4741, 12.3692) projected
  line L18 (-18.4741, -3.6308) -> (-0.3741, -3.6308) projected
  line L19 (-0.3741, -3.6308) -> (-0.3741, -7.6308) projected
  line L20 (-0.3741, -7.6308) -> (7.8759, -7.6308) projected
  line L21 (7.8759, -7.6308) -> (7.8759, -3.6308) projected
  line L22 (7.8759, -3.6308) -> (13.3759, -3.6308) projected
  line L23 (13.3759, -3.6308) -> (13.3759, -7.6308) projected
  line L24 (13.3759, -7.6308) -> (21.8759, -7.6308) projected
  line L25 (21.8759, -7.6308) -> (21.8759, -3.6308) projected
  line L26 (21.8759, -3.6308) -> (27.3759, -3.6308) projected
  line L27 (27.3759, -3.6308) -> (27.3759, -7.6308) projected
  line L28 (27.3759, -7.6308) -> (35.8759, -7.6308) projected
  line L29 (35.8759, -7.6308) -> (35.8759, -3.6308) projected
  line L30 (35.8759, -3.6308) -> (41.3759, -3.6308) projected
  line L31 (41.3759, -3.6308) -> (41.3759, -7.6308) projected
  line L32 (41.3759, -7.6308) -> (49.8759, -7.6308) projected
  line L33 (49.8759, -7.6308) -> (49.8759, -3.6308) projected
  line L34 (49.8759, -3.6308) -> (55.3759, -3.6308) projected
  line L35 (55.3759, -3.6308) -> (55.3759, -7.6308) projected
  line L36 (55.3759, -7.6308) -> (63.6259, -7.6308) projected
  line L37 (63.6259, -7.6308) -> (63.6259, -3.6308) projected
  line L38 (63.6259, -3.6308) -> (67.6259, -3.6308) projected
  line L39 (67.6259, -3.6308) -> (67.6259, 292.3692) projected
  line L40 (67.6259, 292.3692) -> (55.2759, 292.3692) projected
  line L41 (55.2759, 292.3692) -> (55.2759, 288.3692) projected
  line L42 (55.2759, 288.3692) -> (49.7759, 288.3692) projected
  line L43 (49.7759, 288.3692) -> (49.7759, 292.3692) projected
  line L44 (49.7759, 292.3692) -> (41.2759, 292.3692) projected
  line L45 (41.2759, 292.3692) -> (41.2759, 288.3692) projected
  line L46 (41.2759, 288.3692) -> (35.7759, 288.3692) projected
  line L47 (35.7759, 288.3692) -> (35.7759, 292.3692) projected
  line L48 (35.7759, 292.3692) -> (27.2759, 292.3692) projected
  line L49 (27.2759, 292.3692) -> (27.2759, 288.3692) projected
  line L50 (27.2759, 288.3692) -> (21.7759, 288.3692) projected
  line L51 (21.7759, 288.3692) -> (21.7759, 292.3692) projected
  line L52 (21.7759, 292.3692) -> (13.2759, 292.3692) projected
  line L53 (13.2759, 292.3692) -> (13.2759, 288.3692) projected
  line L54 (13.2759, 288.3692) -> (7.7759, 288.3692) projected
  line L55 (7.7759, 288.3692) -> (7.7759, 292.3692) projected
  line L56 (7.7759, 292.3692) -> (-0.4741, 292.3692) projected
  line L57 (-0.4741, 292.3692) -> (-0.4741, 288.3692) projected
  line L58 (-8.4741, 37.1192) -> (-8.4741, 22.6192) projected
  line L59 (-8.4741, 37.1192) -> (-4.4741, 37.1192) projected
  line L60 (-4.4741, 37.1192) -> (-4.4741, 22.6192) projected
  line L61 (-4.4741, 22.6192) -> (-8.4741, 22.6192) projected
  line L62 (-8.4741, 127.1192) -> (-8.4741, 112.6192) projected
  line L63 (-8.4741, 127.1192) -> (-4.4741, 127.1192) projected
  line L64 (-4.4741, 127.1192) -> (-4.4741, 112.6192) projected
  line L65 (-4.4741, 112.6192) -> (-8.4741, 112.6192) projected
  line L66 (-8.4741, 157.1192) -> (-8.4741, 142.6192) projected
  line L67 (-8.4741, 157.1192) -> (-4.4741, 157.1192) projected
  line L68 (-4.4741, 157.1192) -> (-4.4741, 142.6192) projected
  line L69 (-4.4741, 142.6192) -> (-8.4741, 142.6192) projected
  line L70 (-8.4741, 187.1192) -> (-8.4741, 172.6192) projected
  line L71 (-8.4741, 187.1192) -> (-4.4741, 187.1192) projected
  line L72 (-4.4741, 187.1192) -> (-4.4741, 172.6192) projected
  line L73 (-4.4741, 172.6192) -> (-8.4741, 172.6192) projected
  line L74 (0.3759, 191.0324) -> (0.3759, 206.206) projected
  arc A0 (2.2391, 208.0692) -> (0.3759, 206.206) centre (2.2391, 206.206) ccw projected
  line L75 (2.2391, 208.0692) -> (15.6627, 208.0692) projected
  arc A1 (17.5259, 206.206) -> (15.6627, 208.0692) centre (15.6627, 206.206) ccw projected
  line L76 (17.5259, 206.206) -> (17.5259, 191.0324) projected
  arc A2 (15.6627, 189.1692) -> (17.5259, 191.0324) centre (15.6627, 191.0324) ccw projected
  line L77 (15.6627, 189.1692) -> (2.2391, 189.1692) projected
  arc A3 (0.3759, 191.0324) -> (2.2391, 189.1692) centre (2.2391, 191.0324) ccw projected
  line L78 (-1.0491, 127.8692) -> (-1.0491, 177.8692) projected
  arc A4 (0.9509, 179.8692) -> (-1.0491, 177.8692) centre (0.9509, 177.8692) ccw projected
  line L79 (0.9509, 179.8692) -> (16.9509, 179.8692) projected
  arc A5 (18.9509, 177.8692) -> (16.9509, 179.8692) centre (16.9509, 177.8692) ccw projected
  line L80 (18.9509, 177.8692) -> (18.9509, 127.8692) projected
  arc A6 (16.9509, 125.8692) -> (18.9509, 127.8692) centre (16.9509, 127.8692) ccw projected
  line L81 (16.9509, 125.8692) -> (0.9509, 125.8692) projected
  arc A7 (-1.0491, 127.8692) -> (0.9509, 125.8692) centre (0.9509, 127.8692) ccw projected
  line L82 (-8.4741, 217.1192) -> (-8.4741, 202.6192) projected
  line L83 (-8.4741, 217.1192) -> (-4.4741, 217.1192) projected
  line L84 (-4.4741, 217.1192) -> (-4.4741, 202.6192) projected
  line L85 (-4.4741, 202.6192) -> (-8.4741, 202.6192) projected
  line L86 (63.6259, 292.3692) -> (63.6259, 288.3692)
  line L87 (63.6259, 288.3692) -> (67.6259, 288.3692)
  line L88 (67.6259, -3.6308) -> (67.6259, 292.3692) projected
  point P0 (0, 0)
  dimension "d52" = 4
  dimension "d53" = 4
extrude "Extrusion4" cut sketch "Sketch4" against normal through all contours L40 L39 L87 L86
properties part number "back"
